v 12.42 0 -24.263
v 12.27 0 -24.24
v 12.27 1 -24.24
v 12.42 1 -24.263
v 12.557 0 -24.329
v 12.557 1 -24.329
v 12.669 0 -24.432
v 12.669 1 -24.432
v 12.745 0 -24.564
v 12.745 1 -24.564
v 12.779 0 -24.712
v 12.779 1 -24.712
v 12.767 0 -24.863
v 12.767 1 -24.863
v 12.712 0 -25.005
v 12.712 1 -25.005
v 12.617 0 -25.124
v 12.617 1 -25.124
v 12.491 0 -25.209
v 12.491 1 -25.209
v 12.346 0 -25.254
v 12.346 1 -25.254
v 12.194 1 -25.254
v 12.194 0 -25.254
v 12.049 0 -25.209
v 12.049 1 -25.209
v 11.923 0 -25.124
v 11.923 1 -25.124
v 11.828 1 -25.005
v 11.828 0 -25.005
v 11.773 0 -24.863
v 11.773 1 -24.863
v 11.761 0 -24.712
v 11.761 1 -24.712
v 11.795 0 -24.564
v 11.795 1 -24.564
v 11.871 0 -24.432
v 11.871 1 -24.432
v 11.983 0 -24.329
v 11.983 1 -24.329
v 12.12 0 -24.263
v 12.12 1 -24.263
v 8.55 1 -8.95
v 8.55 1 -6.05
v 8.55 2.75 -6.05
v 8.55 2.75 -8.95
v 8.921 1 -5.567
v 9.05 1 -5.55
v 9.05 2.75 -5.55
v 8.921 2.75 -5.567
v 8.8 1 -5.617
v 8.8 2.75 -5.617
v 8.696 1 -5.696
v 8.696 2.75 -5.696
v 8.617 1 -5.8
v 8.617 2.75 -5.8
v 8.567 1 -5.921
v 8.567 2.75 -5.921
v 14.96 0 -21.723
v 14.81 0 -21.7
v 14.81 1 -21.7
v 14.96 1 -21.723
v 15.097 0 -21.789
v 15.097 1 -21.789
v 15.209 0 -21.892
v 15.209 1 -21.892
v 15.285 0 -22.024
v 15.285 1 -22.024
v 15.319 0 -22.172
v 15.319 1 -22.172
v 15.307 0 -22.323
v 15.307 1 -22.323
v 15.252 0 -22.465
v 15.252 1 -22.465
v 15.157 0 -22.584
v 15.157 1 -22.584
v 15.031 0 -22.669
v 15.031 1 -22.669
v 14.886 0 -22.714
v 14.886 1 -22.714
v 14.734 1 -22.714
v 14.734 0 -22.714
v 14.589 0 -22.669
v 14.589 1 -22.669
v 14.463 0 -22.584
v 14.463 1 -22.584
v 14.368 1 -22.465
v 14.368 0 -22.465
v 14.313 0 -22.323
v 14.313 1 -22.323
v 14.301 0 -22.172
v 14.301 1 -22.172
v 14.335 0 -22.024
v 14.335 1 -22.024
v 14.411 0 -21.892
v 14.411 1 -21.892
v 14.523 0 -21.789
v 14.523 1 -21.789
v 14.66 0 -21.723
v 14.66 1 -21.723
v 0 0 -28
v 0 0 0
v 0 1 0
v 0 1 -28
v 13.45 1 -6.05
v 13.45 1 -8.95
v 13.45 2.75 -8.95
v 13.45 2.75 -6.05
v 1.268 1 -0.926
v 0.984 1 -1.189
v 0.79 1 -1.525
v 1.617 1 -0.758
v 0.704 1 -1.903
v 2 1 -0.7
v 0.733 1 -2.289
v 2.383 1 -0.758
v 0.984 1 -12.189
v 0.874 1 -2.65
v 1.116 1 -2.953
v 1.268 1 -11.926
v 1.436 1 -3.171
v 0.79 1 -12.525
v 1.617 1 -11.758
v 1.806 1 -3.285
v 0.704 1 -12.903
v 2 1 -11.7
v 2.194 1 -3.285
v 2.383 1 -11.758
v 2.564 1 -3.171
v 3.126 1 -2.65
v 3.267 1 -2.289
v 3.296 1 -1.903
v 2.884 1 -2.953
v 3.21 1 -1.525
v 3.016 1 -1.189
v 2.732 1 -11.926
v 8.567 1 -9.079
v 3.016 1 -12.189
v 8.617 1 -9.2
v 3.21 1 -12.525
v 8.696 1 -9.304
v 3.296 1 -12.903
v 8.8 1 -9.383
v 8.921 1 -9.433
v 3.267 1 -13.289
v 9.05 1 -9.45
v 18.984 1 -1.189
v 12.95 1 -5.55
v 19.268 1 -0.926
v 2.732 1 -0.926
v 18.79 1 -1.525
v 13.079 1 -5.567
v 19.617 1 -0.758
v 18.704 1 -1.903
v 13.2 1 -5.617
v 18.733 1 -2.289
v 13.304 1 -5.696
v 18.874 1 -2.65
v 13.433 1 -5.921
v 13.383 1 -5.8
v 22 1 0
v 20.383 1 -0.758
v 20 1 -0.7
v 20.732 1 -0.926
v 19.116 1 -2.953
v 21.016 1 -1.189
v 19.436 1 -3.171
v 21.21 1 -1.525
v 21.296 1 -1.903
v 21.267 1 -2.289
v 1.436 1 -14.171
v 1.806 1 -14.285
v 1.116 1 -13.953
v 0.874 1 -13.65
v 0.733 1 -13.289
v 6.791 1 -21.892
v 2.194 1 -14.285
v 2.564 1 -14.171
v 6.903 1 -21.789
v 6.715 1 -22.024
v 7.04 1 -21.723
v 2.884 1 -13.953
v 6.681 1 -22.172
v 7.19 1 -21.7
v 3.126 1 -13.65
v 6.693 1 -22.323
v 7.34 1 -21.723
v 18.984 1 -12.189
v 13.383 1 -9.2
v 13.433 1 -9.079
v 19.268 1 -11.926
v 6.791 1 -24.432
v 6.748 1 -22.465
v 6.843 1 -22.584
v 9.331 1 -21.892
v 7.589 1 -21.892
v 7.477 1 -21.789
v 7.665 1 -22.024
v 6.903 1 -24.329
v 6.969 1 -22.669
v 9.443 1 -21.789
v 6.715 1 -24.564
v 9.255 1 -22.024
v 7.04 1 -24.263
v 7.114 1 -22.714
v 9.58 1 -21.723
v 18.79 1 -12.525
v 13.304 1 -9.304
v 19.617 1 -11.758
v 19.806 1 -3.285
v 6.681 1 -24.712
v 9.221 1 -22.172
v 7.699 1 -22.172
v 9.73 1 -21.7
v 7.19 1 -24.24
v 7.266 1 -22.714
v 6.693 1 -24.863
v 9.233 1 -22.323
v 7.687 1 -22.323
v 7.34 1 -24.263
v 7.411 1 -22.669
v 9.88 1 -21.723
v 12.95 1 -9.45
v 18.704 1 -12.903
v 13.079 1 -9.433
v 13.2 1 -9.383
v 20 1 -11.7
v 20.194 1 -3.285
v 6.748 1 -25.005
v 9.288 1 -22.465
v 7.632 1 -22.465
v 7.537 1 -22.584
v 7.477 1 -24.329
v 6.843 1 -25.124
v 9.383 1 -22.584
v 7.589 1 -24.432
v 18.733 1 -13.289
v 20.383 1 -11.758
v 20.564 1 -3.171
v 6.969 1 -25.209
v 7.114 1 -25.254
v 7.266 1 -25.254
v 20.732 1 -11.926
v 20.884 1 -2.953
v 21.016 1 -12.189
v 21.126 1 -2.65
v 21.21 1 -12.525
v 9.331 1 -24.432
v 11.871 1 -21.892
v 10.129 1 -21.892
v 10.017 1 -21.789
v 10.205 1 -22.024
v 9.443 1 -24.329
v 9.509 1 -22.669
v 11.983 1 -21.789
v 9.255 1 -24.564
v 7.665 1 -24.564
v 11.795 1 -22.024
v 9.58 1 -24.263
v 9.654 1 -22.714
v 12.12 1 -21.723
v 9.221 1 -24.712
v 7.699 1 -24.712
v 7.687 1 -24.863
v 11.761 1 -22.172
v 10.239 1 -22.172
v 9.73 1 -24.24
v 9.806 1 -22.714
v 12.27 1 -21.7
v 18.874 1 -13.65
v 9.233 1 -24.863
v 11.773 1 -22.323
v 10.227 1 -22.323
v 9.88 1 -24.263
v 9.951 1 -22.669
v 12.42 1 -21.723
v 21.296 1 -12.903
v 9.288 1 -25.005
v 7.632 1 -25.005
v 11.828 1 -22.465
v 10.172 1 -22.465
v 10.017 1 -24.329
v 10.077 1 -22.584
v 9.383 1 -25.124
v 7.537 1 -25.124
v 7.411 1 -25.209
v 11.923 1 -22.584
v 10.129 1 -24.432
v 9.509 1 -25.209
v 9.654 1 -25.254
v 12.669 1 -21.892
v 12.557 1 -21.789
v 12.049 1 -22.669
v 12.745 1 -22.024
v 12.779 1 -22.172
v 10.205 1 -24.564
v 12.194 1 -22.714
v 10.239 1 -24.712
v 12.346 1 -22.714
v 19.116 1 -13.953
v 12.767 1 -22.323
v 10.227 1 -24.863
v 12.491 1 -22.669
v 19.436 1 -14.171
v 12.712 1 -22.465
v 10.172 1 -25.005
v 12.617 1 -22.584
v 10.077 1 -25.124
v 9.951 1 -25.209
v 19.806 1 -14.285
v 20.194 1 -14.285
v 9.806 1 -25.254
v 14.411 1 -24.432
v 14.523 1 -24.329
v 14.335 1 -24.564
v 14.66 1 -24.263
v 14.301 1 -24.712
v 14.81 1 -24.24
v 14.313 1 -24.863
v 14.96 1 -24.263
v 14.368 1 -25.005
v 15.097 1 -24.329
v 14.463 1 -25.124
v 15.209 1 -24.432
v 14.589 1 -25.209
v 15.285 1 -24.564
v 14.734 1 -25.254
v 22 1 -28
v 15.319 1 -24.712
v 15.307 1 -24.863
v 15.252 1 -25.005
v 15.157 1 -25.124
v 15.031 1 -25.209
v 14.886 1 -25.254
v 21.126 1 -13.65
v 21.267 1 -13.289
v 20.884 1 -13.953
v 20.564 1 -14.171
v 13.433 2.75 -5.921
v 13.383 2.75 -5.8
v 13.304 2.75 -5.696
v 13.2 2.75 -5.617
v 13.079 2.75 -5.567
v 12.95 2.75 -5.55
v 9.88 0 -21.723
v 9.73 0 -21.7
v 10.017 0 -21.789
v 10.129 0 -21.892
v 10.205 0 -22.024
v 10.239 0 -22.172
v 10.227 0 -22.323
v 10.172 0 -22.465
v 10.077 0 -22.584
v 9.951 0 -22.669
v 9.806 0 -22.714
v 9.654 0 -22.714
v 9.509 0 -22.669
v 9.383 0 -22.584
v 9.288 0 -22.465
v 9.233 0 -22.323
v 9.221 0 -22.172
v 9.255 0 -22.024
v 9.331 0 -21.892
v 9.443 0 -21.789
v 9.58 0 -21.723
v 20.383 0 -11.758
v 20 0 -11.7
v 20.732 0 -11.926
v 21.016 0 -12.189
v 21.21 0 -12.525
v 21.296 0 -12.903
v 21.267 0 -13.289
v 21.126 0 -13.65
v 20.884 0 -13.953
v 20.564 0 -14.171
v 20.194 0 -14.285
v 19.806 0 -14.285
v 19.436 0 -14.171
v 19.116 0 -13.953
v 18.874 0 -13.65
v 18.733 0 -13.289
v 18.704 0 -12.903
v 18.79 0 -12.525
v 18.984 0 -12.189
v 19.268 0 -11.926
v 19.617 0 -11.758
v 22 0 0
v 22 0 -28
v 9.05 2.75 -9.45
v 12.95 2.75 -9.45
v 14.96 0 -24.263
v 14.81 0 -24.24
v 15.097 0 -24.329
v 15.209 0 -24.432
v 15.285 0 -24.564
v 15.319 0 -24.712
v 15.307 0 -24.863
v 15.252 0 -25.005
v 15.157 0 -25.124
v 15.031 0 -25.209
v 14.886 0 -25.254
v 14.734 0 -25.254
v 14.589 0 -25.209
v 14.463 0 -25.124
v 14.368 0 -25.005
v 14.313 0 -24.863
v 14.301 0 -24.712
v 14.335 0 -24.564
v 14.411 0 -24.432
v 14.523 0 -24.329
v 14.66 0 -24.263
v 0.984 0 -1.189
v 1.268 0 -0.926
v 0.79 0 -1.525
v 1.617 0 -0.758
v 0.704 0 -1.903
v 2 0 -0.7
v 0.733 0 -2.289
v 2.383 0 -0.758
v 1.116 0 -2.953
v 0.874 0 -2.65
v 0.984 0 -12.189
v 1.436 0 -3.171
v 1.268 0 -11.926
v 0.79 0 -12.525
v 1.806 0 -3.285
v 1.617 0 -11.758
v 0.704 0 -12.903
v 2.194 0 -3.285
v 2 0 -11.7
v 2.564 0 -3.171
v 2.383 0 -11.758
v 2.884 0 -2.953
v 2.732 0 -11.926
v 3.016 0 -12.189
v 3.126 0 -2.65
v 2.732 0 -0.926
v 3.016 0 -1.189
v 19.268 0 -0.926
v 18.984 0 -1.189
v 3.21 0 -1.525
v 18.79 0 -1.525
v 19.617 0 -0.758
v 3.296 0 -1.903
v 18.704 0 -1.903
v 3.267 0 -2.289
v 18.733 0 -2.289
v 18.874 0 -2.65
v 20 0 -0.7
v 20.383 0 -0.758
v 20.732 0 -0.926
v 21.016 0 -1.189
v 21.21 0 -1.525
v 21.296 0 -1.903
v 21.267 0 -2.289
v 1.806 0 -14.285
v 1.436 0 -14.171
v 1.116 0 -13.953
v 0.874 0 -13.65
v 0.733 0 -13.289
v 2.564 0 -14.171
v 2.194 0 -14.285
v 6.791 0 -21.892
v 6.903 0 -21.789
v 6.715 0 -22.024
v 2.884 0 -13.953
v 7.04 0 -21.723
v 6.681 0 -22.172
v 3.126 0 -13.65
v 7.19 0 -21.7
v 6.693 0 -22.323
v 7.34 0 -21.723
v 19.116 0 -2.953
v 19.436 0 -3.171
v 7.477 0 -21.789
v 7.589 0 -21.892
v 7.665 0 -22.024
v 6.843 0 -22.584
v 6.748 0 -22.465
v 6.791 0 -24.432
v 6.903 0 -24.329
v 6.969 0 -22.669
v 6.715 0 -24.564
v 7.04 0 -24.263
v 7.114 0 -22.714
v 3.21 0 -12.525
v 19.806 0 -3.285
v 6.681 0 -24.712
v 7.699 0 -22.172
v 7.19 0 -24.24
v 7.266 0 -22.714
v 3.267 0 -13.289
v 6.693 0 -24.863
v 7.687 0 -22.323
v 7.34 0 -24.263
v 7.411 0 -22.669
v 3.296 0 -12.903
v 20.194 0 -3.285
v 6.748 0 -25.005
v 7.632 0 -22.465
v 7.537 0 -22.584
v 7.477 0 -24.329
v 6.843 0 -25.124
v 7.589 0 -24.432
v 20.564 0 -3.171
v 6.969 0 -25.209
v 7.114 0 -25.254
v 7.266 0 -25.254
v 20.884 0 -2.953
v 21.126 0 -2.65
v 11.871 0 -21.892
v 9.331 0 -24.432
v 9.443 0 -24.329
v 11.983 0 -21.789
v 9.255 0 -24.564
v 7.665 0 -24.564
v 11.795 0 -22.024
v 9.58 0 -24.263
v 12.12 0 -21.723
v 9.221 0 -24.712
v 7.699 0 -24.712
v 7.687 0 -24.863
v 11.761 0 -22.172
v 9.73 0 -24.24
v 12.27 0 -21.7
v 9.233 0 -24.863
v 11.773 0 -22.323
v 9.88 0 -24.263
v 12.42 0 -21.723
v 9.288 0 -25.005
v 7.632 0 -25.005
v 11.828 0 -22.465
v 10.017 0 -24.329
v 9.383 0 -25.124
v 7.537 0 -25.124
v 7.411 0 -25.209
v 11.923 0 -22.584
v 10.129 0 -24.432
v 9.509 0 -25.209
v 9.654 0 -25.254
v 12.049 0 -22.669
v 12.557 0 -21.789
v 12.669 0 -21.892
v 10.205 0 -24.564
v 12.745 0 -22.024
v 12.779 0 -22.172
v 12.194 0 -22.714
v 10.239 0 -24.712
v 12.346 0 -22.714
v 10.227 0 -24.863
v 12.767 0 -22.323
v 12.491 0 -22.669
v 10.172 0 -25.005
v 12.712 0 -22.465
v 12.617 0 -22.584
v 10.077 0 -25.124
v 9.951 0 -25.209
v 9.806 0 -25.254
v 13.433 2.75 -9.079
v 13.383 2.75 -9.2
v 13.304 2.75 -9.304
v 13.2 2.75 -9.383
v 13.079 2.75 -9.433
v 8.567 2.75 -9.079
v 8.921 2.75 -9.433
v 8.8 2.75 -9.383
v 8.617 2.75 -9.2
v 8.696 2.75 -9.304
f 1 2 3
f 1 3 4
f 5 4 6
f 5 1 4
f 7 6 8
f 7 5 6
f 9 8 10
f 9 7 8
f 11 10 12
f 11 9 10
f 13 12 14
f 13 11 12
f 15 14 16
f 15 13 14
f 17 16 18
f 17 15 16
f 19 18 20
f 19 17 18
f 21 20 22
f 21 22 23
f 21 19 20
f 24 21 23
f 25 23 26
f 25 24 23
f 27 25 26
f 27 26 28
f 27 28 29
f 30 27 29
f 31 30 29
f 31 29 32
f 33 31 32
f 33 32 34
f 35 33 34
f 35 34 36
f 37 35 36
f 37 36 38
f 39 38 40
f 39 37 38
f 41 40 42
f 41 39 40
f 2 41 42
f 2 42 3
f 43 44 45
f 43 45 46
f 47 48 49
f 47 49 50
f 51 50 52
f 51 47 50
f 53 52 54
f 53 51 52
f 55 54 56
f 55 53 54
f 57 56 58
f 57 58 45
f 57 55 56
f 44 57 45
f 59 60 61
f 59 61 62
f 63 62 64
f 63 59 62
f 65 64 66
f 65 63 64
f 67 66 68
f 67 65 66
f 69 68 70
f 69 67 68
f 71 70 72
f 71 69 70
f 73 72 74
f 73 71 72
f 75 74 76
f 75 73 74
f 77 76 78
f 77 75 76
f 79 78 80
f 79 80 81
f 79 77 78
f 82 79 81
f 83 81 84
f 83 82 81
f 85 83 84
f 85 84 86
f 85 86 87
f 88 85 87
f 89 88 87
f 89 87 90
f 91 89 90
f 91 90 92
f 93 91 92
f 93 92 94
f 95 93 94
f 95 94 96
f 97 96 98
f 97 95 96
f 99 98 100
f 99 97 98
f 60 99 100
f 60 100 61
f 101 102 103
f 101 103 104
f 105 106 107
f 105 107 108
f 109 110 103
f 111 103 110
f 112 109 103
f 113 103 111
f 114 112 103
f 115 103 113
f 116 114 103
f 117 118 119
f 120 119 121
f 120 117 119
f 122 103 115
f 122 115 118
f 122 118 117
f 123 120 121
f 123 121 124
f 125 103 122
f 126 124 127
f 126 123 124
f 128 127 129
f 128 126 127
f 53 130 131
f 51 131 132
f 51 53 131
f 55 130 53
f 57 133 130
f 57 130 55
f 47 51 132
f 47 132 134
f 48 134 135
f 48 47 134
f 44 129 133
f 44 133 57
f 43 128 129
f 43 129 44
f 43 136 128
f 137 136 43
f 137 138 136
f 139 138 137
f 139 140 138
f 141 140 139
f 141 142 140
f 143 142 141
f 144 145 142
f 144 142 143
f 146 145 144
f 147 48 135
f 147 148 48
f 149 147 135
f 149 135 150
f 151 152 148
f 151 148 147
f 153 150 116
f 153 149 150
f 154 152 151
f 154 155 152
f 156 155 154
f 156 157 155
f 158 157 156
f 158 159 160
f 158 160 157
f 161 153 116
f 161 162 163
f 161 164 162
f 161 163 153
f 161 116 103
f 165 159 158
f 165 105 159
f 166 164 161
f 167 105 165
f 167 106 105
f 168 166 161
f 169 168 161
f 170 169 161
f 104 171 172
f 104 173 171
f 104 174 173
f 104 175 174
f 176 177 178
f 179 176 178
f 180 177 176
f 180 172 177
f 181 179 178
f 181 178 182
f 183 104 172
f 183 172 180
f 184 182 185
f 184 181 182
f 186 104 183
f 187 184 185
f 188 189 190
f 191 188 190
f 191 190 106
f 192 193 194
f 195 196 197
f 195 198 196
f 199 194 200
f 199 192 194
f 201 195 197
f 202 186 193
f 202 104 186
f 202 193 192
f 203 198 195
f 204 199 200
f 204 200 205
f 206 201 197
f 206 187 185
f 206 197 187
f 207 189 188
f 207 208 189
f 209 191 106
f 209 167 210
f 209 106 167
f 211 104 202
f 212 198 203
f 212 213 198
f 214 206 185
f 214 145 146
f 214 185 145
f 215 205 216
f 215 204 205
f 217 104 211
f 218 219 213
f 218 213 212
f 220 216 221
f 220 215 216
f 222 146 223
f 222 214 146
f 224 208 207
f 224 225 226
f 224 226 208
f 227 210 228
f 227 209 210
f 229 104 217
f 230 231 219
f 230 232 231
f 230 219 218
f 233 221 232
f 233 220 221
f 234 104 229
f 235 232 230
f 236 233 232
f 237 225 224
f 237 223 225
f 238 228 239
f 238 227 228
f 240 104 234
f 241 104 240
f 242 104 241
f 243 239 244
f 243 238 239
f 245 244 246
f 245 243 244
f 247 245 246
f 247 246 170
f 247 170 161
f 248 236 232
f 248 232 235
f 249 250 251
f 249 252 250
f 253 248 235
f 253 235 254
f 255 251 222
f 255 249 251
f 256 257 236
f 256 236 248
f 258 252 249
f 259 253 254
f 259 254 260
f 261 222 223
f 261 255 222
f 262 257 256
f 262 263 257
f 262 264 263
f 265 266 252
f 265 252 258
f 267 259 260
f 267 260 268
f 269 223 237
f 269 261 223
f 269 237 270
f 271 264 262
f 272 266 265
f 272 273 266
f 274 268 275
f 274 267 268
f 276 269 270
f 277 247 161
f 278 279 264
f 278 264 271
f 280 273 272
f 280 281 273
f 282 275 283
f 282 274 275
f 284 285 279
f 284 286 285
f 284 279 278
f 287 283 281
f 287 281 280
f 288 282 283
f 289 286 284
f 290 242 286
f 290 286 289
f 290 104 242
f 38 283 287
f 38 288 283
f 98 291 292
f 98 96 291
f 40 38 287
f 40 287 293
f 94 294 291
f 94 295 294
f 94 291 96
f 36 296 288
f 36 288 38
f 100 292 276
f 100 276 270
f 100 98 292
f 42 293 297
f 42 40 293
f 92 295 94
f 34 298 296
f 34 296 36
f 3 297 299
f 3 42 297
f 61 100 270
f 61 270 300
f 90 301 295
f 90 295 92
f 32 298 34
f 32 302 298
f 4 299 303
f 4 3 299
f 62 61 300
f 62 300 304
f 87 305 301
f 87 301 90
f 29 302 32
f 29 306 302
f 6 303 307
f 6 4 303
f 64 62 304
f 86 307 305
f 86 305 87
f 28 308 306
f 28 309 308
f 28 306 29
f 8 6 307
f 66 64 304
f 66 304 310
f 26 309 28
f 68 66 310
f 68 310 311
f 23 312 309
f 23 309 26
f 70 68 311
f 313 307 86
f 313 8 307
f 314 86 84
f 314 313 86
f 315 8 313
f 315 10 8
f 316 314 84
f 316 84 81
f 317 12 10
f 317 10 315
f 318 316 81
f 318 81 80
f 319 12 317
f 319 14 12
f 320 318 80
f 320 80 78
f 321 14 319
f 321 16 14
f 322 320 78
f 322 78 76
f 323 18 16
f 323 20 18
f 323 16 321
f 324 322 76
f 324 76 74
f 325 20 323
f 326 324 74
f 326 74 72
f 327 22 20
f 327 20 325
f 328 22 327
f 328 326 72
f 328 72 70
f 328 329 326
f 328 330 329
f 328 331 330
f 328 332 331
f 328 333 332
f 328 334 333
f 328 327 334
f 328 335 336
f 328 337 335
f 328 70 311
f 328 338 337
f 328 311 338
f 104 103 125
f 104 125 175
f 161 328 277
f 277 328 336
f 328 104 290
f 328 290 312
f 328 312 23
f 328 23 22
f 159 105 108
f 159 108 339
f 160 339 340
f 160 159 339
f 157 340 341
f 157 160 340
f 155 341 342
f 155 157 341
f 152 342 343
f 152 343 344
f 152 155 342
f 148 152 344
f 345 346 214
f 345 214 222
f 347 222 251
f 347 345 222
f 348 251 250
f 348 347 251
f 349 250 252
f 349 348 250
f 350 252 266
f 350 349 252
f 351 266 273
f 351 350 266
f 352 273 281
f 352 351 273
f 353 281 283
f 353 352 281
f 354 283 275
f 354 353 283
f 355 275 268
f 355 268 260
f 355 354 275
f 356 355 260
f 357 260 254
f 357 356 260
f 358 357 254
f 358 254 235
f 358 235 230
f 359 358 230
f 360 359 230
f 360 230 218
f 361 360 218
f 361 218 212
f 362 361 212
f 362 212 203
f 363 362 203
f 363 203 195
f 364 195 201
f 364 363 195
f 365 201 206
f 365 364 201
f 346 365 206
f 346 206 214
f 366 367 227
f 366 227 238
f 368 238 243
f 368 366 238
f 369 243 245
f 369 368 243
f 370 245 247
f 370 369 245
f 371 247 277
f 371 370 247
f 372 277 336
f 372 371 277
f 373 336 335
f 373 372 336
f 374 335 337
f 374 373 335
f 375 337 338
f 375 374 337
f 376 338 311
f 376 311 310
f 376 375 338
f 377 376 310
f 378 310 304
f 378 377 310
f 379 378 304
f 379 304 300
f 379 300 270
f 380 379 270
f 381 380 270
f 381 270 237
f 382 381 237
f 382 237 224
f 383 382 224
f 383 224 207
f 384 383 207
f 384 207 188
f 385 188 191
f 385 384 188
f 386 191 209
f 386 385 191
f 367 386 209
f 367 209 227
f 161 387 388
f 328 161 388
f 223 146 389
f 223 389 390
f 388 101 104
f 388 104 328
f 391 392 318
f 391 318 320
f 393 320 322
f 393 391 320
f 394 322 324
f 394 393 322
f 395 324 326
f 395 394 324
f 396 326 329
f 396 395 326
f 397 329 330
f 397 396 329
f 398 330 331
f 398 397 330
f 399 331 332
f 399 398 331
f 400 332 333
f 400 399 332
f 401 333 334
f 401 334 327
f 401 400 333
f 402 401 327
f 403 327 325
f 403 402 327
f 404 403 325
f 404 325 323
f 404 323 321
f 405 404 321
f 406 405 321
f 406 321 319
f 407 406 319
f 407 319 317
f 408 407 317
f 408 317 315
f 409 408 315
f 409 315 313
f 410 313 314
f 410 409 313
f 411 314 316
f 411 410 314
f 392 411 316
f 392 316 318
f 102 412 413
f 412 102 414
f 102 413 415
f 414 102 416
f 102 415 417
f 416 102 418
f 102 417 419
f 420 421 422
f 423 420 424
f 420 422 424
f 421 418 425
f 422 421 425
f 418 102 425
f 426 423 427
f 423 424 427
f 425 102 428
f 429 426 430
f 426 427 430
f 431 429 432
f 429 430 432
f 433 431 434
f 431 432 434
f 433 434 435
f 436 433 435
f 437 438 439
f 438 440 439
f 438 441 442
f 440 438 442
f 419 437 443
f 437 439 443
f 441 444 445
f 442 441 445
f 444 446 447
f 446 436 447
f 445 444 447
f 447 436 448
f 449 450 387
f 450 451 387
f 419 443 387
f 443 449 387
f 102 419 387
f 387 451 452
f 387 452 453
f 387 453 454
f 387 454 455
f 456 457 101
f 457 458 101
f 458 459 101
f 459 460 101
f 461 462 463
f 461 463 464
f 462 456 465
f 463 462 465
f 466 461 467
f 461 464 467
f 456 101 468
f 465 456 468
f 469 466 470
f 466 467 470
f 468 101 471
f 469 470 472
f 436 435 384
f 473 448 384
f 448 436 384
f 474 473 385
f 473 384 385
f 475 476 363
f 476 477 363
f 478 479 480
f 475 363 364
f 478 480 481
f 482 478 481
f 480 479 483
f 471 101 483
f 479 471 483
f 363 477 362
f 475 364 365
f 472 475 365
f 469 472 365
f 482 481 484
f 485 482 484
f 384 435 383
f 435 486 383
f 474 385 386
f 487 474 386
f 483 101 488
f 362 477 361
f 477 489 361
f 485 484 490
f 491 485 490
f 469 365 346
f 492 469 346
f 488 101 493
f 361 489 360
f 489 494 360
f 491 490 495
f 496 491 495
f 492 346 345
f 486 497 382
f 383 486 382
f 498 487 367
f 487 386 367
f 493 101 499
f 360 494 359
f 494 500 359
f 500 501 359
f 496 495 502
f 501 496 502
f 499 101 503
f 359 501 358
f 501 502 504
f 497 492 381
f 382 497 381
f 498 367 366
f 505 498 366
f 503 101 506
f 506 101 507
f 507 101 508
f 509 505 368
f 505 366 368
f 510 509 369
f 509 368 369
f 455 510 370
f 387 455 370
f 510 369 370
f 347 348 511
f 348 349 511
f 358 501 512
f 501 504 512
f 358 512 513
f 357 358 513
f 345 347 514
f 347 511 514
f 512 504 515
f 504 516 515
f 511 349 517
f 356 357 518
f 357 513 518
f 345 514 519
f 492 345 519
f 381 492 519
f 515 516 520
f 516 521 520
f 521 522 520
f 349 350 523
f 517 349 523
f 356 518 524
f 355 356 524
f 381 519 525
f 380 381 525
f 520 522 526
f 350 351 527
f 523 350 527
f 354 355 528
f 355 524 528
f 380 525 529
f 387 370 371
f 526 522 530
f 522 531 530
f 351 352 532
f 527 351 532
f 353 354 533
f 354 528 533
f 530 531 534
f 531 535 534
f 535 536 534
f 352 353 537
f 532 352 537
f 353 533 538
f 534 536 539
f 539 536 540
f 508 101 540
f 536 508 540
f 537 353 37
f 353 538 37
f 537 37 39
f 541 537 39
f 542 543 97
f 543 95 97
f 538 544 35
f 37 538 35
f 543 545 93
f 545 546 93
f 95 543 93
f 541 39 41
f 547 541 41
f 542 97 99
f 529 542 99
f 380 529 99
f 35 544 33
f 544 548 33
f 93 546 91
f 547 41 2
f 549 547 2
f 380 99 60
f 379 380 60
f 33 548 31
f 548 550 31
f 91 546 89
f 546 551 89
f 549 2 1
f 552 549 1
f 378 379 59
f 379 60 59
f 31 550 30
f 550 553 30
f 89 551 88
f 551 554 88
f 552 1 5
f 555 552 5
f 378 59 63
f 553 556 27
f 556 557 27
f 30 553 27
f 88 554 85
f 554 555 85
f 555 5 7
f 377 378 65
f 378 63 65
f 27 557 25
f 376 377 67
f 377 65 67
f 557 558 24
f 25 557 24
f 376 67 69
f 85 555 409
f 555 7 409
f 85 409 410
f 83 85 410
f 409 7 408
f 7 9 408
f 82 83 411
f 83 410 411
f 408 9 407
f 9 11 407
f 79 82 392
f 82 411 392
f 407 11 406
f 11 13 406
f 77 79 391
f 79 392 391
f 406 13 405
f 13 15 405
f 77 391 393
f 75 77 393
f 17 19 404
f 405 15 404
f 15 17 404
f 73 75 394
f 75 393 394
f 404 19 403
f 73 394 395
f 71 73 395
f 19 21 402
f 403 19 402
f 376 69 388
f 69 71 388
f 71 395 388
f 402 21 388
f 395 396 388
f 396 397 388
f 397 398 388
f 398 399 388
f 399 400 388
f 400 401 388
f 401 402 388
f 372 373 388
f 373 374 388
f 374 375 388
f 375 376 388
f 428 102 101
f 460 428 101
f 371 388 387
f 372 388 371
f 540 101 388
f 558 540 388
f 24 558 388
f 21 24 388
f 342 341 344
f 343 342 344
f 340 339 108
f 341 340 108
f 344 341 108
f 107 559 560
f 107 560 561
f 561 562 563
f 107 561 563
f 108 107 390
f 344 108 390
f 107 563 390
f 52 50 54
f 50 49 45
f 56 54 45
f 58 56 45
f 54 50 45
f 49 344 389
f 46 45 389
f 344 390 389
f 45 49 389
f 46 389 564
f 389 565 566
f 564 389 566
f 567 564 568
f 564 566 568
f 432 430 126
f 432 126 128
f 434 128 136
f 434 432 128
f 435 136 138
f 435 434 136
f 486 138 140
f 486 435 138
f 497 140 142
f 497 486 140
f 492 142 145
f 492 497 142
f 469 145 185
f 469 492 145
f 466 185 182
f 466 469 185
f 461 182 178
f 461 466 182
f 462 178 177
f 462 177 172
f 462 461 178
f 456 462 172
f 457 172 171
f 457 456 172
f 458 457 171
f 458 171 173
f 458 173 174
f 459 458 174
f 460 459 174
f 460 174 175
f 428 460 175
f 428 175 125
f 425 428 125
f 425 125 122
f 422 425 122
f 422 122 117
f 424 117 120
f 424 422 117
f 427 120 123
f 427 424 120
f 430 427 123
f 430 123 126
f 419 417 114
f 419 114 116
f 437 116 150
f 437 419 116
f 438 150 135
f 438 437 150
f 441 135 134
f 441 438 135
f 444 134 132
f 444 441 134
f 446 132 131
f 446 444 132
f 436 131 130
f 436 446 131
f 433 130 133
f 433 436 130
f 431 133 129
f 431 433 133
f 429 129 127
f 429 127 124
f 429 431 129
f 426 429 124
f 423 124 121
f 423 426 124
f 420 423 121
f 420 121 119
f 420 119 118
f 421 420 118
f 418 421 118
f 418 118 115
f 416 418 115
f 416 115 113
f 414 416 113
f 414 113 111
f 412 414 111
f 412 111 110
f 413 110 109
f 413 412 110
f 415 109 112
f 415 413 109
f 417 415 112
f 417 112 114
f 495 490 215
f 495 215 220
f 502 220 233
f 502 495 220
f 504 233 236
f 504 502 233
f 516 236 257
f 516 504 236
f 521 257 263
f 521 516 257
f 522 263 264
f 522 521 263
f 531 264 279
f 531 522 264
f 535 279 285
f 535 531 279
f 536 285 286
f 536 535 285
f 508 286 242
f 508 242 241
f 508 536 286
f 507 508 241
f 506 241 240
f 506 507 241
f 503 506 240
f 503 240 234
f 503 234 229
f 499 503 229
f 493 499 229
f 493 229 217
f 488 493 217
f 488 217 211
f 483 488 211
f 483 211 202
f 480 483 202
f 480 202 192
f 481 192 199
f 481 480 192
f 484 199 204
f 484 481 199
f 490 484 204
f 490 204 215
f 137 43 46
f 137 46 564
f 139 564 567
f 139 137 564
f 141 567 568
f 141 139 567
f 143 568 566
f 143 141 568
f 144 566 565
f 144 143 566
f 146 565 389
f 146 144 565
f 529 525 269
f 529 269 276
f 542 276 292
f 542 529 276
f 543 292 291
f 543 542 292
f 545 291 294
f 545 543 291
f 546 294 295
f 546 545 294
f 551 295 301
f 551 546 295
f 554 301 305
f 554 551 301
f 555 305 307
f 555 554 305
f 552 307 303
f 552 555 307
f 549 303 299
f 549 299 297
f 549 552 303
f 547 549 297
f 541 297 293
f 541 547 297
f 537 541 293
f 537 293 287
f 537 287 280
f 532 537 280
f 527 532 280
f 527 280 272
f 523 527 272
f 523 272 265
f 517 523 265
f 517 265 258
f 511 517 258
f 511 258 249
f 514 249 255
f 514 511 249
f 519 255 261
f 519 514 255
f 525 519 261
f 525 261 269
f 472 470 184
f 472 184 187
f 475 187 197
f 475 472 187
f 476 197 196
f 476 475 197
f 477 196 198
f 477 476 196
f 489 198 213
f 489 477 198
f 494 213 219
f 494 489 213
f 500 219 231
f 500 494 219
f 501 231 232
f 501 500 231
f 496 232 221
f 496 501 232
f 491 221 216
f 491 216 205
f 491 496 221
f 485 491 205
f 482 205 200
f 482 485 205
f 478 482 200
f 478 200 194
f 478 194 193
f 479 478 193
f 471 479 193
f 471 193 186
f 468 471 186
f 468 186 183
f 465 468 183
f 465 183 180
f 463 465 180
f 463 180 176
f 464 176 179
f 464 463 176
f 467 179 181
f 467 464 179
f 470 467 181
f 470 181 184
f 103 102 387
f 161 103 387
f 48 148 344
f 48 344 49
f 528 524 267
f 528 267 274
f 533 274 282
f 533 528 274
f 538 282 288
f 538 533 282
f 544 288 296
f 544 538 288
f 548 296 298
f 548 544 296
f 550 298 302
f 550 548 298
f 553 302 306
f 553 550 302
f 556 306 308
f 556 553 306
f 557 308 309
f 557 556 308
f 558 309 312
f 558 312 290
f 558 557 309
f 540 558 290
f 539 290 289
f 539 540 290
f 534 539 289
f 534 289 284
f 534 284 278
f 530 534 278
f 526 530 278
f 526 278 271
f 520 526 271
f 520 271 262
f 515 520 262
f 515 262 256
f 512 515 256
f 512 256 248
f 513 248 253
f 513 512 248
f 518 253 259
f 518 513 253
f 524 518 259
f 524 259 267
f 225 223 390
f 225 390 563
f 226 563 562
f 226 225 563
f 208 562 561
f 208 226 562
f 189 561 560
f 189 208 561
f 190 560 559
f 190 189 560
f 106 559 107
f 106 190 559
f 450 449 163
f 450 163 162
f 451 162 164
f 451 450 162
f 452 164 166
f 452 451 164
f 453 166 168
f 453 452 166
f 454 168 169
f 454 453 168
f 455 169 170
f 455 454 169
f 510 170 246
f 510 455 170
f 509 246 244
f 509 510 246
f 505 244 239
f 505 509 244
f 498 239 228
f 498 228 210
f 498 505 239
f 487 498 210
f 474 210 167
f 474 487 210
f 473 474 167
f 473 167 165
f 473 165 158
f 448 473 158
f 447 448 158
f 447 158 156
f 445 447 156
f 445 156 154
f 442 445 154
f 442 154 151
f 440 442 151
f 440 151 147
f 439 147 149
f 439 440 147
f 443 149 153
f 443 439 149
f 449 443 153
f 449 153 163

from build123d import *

# Parameters (mm, degrees)
SKETCH1_W           = 22
SKETCH1_H           = 28
SKETCH1_R           = 1.3
SKETCH1_R_2         = 0.51
BOSS_EXTRUDE1_DEPTH = 1
BOSS_EXTRUDE2_DEPTH = 1.75


with BuildPart() as part:
    # Sketch1 → Boss-Extrude1 (new body)
    with BuildSketch(Plane(origin=(0, 0, 0), x_dir=(1, 0, 0), z_dir=(0, 1, 0))):
        with Locations((11, 14)):
            Rectangle(SKETCH1_W, SKETCH1_H)
        with Locations(Location((2, 2, 0), (0, 0, 270))):
            Circle(SKETCH1_R, mode=Mode.SUBTRACT)
        with Locations(Location((20, 2, 0), (0, 0, 270))):
            Circle(SKETCH1_R, mode=Mode.SUBTRACT)
        with Locations(Location((20, 13, 0), (0, 0, 270))):
            Circle(SKETCH1_R, mode=Mode.SUBTRACT)
        with Locations(Location((2, 13, 0), (0, 0, 270))):
            Circle(SKETCH1_R, mode=Mode.SUBTRACT)
        with Locations(Location((14.81, 24.75, 0), (0, 0, 270))):
            Circle(SKETCH1_R_2, mode=Mode.SUBTRACT)
        with Locations(Location((14.81, 22.21, 0), (0, 0, 270))):
            Circle(SKETCH1_R_2, mode=Mode.SUBTRACT)
        with Locations(Location((12.27, 24.75, 0), (0, 0, 270))):
            Circle(SKETCH1_R_2, mode=Mode.SUBTRACT)
        with Locations(Location((9.73, 24.75, 0), (0, 0, 270))):
            Circle(SKETCH1_R_2, mode=Mode.SUBTRACT)
        with Locations(Location((7.19, 24.75, 0), (0, 0, 270))):
            Circle(SKETCH1_R_2, mode=Mode.SUBTRACT)
        with Locations(Location((12.27, 22.21, 0), (0, 0, 270))):
            Circle(SKETCH1_R_2, mode=Mode.SUBTRACT)
        with Locations(Location((9.73, 22.21, 0), (0, 0, 270))):
            Circle(SKETCH1_R_2, mode=Mode.SUBTRACT)
        with Locations(Location((7.19, 22.21, 0), (0, 0, 270))):
            Circle(SKETCH1_R_2, mode=Mode.SUBTRACT)
    extrude(amount=BOSS_EXTRUDE1_DEPTH)

    # Sketch2 → Boss-Extrude2 (add)
    with BuildSketch(Plane(origin=(0, 1, 0), x_dir=(1, 0, 0), z_dir=(0, 1, 0))):
        with BuildLine():
            Line((9.05, 9.45), (12.95, 9.45))
            ThreePointArc((12.95, 9.45), (13.303553391, 9.303553391), (13.45, 8.95))
            Line((13.45, 8.95), (13.45, 6.05))
            ThreePointArc((13.45, 6.05), (13.303553391, 5.696446609), (12.95, 5.55))
            Line((12.95, 5.55), (9.05, 5.55))
            ThreePointArc((9.05, 5.55), (8.696446609, 5.696446609), (8.55, 6.05))
            Line((8.55, 6.05), (8.55, 8.95))
            ThreePointArc((8.55, 8.95), (8.696446609, 9.303553391), (9.05, 9.45))
        make_face()
    extrude(amount=BOSS_EXTRUDE2_DEPTH)


solid = part.part
